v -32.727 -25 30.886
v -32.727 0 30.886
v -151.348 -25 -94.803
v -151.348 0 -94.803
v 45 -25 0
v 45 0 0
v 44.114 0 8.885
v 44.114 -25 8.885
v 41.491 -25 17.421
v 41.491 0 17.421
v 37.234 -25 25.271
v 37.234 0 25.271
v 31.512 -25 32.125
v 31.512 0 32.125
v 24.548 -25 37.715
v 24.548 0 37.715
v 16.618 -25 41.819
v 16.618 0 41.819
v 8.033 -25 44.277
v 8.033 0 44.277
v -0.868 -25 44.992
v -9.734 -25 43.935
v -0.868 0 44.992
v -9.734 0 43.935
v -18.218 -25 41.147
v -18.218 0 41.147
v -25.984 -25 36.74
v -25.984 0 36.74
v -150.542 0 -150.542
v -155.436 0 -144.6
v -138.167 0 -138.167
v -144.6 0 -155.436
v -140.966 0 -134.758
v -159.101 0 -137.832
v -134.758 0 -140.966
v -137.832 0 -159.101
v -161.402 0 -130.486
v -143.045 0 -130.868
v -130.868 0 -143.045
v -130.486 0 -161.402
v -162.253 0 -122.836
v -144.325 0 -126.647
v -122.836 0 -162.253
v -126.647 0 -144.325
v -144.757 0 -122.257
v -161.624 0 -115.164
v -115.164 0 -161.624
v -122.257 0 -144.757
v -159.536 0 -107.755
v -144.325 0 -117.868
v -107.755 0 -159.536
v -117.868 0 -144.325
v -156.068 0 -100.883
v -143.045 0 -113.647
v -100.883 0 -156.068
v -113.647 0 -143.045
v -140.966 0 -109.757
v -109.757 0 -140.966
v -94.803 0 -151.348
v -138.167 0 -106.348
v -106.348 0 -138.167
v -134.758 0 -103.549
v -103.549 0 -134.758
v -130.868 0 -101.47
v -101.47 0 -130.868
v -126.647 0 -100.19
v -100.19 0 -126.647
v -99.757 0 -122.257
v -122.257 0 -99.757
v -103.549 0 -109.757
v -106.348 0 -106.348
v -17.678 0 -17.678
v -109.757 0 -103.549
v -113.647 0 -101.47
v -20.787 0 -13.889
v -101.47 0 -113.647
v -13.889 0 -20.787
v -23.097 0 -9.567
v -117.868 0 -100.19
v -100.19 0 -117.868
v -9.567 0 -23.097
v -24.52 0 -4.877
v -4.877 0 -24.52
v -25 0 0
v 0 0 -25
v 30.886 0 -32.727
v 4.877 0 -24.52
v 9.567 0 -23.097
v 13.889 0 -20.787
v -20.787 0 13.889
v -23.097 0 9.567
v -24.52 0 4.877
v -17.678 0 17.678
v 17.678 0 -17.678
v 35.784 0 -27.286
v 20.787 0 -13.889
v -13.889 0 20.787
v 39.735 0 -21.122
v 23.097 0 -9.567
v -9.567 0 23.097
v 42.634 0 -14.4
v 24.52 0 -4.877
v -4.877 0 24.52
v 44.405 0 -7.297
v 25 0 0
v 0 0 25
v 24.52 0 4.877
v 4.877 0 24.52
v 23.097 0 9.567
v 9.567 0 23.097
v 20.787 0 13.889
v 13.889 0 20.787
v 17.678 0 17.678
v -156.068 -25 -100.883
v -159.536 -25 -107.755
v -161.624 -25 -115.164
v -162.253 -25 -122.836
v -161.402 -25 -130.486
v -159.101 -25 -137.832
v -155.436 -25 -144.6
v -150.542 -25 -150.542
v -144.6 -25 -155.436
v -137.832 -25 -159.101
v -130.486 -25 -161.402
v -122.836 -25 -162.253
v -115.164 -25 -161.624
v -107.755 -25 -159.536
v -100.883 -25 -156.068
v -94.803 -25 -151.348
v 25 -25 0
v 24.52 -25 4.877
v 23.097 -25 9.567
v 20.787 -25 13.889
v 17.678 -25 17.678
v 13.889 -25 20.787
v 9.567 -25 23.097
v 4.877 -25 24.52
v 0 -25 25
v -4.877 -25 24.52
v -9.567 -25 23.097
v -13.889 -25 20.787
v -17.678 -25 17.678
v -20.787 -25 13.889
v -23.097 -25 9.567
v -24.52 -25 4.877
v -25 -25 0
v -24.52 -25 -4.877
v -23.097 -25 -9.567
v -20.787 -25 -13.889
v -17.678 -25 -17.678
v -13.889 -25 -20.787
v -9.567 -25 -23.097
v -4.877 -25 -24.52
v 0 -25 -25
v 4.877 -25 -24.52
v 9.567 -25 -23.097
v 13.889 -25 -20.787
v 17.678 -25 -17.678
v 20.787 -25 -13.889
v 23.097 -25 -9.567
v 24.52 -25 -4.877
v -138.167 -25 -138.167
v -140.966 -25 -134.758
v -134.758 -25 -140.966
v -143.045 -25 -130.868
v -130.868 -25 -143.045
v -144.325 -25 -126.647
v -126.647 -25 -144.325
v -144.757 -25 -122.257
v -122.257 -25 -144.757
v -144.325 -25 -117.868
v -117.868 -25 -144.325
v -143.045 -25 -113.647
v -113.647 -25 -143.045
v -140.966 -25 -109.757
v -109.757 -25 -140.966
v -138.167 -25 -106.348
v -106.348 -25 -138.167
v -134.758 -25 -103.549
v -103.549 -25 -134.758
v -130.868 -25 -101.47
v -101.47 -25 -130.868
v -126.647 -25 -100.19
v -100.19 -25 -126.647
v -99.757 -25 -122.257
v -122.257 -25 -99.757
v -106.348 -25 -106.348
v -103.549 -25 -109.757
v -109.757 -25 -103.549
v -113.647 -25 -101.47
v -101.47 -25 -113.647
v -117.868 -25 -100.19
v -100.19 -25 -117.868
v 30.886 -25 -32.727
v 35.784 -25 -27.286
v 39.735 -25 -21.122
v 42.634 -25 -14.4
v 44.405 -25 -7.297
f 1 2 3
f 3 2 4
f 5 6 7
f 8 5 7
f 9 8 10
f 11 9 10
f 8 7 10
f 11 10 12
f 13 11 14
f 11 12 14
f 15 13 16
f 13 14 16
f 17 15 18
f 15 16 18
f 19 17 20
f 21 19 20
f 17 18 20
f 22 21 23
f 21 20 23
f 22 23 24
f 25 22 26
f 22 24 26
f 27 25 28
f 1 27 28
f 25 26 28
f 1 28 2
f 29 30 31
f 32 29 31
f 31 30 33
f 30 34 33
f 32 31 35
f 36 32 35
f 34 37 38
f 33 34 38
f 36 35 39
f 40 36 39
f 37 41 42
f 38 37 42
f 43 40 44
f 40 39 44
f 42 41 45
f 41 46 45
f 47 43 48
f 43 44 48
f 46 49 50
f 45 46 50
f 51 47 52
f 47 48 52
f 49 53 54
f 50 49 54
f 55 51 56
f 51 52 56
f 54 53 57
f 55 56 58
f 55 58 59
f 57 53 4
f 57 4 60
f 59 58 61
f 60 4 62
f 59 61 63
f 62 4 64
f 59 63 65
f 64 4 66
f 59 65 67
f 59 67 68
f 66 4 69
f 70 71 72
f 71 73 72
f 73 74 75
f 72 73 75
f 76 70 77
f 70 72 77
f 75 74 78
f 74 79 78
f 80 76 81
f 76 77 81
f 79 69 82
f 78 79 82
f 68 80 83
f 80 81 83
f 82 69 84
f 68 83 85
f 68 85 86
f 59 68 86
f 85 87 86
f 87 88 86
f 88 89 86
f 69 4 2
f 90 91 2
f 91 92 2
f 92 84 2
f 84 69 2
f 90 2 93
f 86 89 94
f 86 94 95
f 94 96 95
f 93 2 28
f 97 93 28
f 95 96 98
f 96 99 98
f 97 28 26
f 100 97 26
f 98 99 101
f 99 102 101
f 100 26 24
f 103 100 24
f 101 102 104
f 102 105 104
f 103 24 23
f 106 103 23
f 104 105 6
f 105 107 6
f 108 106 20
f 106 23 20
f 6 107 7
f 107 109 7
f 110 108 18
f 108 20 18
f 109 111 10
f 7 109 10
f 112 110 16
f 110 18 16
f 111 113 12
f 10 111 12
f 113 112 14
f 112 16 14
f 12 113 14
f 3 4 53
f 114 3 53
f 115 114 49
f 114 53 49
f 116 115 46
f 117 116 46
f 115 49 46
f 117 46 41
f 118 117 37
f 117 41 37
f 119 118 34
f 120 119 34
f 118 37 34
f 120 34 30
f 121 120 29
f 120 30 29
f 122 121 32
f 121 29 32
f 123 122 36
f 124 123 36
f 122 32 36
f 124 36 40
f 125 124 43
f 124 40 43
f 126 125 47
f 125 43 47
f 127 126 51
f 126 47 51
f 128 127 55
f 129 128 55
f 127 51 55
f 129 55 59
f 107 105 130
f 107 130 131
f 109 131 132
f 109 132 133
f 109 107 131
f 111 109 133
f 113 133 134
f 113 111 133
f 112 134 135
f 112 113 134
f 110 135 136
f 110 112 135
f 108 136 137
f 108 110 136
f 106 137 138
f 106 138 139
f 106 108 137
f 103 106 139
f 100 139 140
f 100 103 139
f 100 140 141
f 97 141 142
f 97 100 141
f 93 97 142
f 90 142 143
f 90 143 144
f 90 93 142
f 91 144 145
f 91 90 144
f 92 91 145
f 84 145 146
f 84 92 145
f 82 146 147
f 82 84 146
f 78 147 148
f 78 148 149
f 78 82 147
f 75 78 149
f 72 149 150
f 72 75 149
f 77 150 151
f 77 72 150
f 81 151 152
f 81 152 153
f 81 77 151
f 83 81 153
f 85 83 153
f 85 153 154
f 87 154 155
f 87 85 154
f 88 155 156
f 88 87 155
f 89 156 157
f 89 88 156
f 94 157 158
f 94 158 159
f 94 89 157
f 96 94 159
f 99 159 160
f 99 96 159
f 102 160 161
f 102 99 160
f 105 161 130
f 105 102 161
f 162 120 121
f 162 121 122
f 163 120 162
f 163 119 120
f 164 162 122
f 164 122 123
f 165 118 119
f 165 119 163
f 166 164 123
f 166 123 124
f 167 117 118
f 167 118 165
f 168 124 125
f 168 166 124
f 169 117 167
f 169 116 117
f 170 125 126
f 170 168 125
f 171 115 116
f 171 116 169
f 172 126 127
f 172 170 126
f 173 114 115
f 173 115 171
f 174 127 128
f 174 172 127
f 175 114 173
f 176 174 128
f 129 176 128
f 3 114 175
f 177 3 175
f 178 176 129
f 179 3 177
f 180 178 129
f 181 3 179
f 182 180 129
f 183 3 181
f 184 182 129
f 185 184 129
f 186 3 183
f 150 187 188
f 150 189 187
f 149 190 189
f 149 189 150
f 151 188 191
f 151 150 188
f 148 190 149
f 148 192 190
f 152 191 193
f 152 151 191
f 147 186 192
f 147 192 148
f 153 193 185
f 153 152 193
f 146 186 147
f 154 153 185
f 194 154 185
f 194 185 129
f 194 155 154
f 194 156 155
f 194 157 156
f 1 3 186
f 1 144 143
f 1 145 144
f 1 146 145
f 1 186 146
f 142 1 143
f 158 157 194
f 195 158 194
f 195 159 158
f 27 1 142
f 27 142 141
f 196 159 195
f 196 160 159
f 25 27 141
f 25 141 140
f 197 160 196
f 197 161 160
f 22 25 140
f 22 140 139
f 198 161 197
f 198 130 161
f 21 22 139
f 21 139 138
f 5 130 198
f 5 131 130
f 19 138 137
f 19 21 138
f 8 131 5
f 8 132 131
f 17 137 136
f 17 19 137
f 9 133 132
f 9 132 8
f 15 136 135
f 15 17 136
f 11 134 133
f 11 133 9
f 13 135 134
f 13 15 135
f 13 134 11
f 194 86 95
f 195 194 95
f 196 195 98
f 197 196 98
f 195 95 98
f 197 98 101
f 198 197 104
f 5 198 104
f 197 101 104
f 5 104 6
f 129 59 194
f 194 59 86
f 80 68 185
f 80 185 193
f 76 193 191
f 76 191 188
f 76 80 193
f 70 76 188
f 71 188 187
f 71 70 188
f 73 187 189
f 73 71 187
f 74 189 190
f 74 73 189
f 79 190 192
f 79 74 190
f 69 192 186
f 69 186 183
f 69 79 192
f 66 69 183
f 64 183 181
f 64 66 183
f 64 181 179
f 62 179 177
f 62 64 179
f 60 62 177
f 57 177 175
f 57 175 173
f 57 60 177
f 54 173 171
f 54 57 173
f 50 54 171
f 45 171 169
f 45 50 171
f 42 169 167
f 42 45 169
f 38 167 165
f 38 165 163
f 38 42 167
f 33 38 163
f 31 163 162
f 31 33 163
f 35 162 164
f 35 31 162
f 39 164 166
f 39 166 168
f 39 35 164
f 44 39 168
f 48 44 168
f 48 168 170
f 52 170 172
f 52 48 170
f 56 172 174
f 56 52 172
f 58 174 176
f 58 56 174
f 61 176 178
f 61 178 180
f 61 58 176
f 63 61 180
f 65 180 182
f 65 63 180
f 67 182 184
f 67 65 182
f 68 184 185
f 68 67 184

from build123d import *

# Parameters (mm, degrees)
F0_R     = 25
F0_R_2   = 22.5
F1_DEPTH = 25


with BuildPart() as f1:
    # F0 (on Front) → F1 (new body)
    with BuildSketch(Plane.XZ):
        with BuildLine():
            ThreePointArc((30.886308, -32.726686), (41.321204, -17.820159), (45, 0))
            ThreePointArc((45, 0), (16.617748, 41.819259), (-32.726686, 30.886308))
            ThreePointArc((-32.726686, 30.886308), (-31.819805, -31.819805), (30.886308, -32.726686))
        make_face()
        Circle(F0_R, mode=Mode.SUBTRACT)
        with BuildLine():
            ThreePointArc((30.886308, -32.726686), (-31.819805, -31.819805), (-32.726686, 30.886308))
            Line((-32.726686, 30.886308), (-151.347864, -94.80298))
            ThreePointArc((-151.347864, -94.80298), (-107.486144, -85.084801), (-82.257476, -122.257476))
            ThreePointArc((-82.257476, -122.257476), (-85.527517, -138.097618), (-94.80298, -151.347864))
            Line((-94.80298, -151.347864), (30.886308, -32.726686))
        make_face()
        with BuildLine():
            ThreePointArc((-82.257476, -122.257476), (-107.486144, -85.084801), (-151.347864, -94.80298))
            ThreePointArc((-151.347864, -94.80298), (-150.541748, -150.541748), (-94.80298, -151.347864))
            ThreePointArc((-94.80298, -151.347864), (-85.527517, -138.097618), (-82.257476, -122.257476))
        make_face()
        with Locations((-122.257476, -122.257476)):
            Circle(F0_R_2, mode=Mode.SUBTRACT)
    extrude(amount=F1_DEPTH)


solid = f1.part
